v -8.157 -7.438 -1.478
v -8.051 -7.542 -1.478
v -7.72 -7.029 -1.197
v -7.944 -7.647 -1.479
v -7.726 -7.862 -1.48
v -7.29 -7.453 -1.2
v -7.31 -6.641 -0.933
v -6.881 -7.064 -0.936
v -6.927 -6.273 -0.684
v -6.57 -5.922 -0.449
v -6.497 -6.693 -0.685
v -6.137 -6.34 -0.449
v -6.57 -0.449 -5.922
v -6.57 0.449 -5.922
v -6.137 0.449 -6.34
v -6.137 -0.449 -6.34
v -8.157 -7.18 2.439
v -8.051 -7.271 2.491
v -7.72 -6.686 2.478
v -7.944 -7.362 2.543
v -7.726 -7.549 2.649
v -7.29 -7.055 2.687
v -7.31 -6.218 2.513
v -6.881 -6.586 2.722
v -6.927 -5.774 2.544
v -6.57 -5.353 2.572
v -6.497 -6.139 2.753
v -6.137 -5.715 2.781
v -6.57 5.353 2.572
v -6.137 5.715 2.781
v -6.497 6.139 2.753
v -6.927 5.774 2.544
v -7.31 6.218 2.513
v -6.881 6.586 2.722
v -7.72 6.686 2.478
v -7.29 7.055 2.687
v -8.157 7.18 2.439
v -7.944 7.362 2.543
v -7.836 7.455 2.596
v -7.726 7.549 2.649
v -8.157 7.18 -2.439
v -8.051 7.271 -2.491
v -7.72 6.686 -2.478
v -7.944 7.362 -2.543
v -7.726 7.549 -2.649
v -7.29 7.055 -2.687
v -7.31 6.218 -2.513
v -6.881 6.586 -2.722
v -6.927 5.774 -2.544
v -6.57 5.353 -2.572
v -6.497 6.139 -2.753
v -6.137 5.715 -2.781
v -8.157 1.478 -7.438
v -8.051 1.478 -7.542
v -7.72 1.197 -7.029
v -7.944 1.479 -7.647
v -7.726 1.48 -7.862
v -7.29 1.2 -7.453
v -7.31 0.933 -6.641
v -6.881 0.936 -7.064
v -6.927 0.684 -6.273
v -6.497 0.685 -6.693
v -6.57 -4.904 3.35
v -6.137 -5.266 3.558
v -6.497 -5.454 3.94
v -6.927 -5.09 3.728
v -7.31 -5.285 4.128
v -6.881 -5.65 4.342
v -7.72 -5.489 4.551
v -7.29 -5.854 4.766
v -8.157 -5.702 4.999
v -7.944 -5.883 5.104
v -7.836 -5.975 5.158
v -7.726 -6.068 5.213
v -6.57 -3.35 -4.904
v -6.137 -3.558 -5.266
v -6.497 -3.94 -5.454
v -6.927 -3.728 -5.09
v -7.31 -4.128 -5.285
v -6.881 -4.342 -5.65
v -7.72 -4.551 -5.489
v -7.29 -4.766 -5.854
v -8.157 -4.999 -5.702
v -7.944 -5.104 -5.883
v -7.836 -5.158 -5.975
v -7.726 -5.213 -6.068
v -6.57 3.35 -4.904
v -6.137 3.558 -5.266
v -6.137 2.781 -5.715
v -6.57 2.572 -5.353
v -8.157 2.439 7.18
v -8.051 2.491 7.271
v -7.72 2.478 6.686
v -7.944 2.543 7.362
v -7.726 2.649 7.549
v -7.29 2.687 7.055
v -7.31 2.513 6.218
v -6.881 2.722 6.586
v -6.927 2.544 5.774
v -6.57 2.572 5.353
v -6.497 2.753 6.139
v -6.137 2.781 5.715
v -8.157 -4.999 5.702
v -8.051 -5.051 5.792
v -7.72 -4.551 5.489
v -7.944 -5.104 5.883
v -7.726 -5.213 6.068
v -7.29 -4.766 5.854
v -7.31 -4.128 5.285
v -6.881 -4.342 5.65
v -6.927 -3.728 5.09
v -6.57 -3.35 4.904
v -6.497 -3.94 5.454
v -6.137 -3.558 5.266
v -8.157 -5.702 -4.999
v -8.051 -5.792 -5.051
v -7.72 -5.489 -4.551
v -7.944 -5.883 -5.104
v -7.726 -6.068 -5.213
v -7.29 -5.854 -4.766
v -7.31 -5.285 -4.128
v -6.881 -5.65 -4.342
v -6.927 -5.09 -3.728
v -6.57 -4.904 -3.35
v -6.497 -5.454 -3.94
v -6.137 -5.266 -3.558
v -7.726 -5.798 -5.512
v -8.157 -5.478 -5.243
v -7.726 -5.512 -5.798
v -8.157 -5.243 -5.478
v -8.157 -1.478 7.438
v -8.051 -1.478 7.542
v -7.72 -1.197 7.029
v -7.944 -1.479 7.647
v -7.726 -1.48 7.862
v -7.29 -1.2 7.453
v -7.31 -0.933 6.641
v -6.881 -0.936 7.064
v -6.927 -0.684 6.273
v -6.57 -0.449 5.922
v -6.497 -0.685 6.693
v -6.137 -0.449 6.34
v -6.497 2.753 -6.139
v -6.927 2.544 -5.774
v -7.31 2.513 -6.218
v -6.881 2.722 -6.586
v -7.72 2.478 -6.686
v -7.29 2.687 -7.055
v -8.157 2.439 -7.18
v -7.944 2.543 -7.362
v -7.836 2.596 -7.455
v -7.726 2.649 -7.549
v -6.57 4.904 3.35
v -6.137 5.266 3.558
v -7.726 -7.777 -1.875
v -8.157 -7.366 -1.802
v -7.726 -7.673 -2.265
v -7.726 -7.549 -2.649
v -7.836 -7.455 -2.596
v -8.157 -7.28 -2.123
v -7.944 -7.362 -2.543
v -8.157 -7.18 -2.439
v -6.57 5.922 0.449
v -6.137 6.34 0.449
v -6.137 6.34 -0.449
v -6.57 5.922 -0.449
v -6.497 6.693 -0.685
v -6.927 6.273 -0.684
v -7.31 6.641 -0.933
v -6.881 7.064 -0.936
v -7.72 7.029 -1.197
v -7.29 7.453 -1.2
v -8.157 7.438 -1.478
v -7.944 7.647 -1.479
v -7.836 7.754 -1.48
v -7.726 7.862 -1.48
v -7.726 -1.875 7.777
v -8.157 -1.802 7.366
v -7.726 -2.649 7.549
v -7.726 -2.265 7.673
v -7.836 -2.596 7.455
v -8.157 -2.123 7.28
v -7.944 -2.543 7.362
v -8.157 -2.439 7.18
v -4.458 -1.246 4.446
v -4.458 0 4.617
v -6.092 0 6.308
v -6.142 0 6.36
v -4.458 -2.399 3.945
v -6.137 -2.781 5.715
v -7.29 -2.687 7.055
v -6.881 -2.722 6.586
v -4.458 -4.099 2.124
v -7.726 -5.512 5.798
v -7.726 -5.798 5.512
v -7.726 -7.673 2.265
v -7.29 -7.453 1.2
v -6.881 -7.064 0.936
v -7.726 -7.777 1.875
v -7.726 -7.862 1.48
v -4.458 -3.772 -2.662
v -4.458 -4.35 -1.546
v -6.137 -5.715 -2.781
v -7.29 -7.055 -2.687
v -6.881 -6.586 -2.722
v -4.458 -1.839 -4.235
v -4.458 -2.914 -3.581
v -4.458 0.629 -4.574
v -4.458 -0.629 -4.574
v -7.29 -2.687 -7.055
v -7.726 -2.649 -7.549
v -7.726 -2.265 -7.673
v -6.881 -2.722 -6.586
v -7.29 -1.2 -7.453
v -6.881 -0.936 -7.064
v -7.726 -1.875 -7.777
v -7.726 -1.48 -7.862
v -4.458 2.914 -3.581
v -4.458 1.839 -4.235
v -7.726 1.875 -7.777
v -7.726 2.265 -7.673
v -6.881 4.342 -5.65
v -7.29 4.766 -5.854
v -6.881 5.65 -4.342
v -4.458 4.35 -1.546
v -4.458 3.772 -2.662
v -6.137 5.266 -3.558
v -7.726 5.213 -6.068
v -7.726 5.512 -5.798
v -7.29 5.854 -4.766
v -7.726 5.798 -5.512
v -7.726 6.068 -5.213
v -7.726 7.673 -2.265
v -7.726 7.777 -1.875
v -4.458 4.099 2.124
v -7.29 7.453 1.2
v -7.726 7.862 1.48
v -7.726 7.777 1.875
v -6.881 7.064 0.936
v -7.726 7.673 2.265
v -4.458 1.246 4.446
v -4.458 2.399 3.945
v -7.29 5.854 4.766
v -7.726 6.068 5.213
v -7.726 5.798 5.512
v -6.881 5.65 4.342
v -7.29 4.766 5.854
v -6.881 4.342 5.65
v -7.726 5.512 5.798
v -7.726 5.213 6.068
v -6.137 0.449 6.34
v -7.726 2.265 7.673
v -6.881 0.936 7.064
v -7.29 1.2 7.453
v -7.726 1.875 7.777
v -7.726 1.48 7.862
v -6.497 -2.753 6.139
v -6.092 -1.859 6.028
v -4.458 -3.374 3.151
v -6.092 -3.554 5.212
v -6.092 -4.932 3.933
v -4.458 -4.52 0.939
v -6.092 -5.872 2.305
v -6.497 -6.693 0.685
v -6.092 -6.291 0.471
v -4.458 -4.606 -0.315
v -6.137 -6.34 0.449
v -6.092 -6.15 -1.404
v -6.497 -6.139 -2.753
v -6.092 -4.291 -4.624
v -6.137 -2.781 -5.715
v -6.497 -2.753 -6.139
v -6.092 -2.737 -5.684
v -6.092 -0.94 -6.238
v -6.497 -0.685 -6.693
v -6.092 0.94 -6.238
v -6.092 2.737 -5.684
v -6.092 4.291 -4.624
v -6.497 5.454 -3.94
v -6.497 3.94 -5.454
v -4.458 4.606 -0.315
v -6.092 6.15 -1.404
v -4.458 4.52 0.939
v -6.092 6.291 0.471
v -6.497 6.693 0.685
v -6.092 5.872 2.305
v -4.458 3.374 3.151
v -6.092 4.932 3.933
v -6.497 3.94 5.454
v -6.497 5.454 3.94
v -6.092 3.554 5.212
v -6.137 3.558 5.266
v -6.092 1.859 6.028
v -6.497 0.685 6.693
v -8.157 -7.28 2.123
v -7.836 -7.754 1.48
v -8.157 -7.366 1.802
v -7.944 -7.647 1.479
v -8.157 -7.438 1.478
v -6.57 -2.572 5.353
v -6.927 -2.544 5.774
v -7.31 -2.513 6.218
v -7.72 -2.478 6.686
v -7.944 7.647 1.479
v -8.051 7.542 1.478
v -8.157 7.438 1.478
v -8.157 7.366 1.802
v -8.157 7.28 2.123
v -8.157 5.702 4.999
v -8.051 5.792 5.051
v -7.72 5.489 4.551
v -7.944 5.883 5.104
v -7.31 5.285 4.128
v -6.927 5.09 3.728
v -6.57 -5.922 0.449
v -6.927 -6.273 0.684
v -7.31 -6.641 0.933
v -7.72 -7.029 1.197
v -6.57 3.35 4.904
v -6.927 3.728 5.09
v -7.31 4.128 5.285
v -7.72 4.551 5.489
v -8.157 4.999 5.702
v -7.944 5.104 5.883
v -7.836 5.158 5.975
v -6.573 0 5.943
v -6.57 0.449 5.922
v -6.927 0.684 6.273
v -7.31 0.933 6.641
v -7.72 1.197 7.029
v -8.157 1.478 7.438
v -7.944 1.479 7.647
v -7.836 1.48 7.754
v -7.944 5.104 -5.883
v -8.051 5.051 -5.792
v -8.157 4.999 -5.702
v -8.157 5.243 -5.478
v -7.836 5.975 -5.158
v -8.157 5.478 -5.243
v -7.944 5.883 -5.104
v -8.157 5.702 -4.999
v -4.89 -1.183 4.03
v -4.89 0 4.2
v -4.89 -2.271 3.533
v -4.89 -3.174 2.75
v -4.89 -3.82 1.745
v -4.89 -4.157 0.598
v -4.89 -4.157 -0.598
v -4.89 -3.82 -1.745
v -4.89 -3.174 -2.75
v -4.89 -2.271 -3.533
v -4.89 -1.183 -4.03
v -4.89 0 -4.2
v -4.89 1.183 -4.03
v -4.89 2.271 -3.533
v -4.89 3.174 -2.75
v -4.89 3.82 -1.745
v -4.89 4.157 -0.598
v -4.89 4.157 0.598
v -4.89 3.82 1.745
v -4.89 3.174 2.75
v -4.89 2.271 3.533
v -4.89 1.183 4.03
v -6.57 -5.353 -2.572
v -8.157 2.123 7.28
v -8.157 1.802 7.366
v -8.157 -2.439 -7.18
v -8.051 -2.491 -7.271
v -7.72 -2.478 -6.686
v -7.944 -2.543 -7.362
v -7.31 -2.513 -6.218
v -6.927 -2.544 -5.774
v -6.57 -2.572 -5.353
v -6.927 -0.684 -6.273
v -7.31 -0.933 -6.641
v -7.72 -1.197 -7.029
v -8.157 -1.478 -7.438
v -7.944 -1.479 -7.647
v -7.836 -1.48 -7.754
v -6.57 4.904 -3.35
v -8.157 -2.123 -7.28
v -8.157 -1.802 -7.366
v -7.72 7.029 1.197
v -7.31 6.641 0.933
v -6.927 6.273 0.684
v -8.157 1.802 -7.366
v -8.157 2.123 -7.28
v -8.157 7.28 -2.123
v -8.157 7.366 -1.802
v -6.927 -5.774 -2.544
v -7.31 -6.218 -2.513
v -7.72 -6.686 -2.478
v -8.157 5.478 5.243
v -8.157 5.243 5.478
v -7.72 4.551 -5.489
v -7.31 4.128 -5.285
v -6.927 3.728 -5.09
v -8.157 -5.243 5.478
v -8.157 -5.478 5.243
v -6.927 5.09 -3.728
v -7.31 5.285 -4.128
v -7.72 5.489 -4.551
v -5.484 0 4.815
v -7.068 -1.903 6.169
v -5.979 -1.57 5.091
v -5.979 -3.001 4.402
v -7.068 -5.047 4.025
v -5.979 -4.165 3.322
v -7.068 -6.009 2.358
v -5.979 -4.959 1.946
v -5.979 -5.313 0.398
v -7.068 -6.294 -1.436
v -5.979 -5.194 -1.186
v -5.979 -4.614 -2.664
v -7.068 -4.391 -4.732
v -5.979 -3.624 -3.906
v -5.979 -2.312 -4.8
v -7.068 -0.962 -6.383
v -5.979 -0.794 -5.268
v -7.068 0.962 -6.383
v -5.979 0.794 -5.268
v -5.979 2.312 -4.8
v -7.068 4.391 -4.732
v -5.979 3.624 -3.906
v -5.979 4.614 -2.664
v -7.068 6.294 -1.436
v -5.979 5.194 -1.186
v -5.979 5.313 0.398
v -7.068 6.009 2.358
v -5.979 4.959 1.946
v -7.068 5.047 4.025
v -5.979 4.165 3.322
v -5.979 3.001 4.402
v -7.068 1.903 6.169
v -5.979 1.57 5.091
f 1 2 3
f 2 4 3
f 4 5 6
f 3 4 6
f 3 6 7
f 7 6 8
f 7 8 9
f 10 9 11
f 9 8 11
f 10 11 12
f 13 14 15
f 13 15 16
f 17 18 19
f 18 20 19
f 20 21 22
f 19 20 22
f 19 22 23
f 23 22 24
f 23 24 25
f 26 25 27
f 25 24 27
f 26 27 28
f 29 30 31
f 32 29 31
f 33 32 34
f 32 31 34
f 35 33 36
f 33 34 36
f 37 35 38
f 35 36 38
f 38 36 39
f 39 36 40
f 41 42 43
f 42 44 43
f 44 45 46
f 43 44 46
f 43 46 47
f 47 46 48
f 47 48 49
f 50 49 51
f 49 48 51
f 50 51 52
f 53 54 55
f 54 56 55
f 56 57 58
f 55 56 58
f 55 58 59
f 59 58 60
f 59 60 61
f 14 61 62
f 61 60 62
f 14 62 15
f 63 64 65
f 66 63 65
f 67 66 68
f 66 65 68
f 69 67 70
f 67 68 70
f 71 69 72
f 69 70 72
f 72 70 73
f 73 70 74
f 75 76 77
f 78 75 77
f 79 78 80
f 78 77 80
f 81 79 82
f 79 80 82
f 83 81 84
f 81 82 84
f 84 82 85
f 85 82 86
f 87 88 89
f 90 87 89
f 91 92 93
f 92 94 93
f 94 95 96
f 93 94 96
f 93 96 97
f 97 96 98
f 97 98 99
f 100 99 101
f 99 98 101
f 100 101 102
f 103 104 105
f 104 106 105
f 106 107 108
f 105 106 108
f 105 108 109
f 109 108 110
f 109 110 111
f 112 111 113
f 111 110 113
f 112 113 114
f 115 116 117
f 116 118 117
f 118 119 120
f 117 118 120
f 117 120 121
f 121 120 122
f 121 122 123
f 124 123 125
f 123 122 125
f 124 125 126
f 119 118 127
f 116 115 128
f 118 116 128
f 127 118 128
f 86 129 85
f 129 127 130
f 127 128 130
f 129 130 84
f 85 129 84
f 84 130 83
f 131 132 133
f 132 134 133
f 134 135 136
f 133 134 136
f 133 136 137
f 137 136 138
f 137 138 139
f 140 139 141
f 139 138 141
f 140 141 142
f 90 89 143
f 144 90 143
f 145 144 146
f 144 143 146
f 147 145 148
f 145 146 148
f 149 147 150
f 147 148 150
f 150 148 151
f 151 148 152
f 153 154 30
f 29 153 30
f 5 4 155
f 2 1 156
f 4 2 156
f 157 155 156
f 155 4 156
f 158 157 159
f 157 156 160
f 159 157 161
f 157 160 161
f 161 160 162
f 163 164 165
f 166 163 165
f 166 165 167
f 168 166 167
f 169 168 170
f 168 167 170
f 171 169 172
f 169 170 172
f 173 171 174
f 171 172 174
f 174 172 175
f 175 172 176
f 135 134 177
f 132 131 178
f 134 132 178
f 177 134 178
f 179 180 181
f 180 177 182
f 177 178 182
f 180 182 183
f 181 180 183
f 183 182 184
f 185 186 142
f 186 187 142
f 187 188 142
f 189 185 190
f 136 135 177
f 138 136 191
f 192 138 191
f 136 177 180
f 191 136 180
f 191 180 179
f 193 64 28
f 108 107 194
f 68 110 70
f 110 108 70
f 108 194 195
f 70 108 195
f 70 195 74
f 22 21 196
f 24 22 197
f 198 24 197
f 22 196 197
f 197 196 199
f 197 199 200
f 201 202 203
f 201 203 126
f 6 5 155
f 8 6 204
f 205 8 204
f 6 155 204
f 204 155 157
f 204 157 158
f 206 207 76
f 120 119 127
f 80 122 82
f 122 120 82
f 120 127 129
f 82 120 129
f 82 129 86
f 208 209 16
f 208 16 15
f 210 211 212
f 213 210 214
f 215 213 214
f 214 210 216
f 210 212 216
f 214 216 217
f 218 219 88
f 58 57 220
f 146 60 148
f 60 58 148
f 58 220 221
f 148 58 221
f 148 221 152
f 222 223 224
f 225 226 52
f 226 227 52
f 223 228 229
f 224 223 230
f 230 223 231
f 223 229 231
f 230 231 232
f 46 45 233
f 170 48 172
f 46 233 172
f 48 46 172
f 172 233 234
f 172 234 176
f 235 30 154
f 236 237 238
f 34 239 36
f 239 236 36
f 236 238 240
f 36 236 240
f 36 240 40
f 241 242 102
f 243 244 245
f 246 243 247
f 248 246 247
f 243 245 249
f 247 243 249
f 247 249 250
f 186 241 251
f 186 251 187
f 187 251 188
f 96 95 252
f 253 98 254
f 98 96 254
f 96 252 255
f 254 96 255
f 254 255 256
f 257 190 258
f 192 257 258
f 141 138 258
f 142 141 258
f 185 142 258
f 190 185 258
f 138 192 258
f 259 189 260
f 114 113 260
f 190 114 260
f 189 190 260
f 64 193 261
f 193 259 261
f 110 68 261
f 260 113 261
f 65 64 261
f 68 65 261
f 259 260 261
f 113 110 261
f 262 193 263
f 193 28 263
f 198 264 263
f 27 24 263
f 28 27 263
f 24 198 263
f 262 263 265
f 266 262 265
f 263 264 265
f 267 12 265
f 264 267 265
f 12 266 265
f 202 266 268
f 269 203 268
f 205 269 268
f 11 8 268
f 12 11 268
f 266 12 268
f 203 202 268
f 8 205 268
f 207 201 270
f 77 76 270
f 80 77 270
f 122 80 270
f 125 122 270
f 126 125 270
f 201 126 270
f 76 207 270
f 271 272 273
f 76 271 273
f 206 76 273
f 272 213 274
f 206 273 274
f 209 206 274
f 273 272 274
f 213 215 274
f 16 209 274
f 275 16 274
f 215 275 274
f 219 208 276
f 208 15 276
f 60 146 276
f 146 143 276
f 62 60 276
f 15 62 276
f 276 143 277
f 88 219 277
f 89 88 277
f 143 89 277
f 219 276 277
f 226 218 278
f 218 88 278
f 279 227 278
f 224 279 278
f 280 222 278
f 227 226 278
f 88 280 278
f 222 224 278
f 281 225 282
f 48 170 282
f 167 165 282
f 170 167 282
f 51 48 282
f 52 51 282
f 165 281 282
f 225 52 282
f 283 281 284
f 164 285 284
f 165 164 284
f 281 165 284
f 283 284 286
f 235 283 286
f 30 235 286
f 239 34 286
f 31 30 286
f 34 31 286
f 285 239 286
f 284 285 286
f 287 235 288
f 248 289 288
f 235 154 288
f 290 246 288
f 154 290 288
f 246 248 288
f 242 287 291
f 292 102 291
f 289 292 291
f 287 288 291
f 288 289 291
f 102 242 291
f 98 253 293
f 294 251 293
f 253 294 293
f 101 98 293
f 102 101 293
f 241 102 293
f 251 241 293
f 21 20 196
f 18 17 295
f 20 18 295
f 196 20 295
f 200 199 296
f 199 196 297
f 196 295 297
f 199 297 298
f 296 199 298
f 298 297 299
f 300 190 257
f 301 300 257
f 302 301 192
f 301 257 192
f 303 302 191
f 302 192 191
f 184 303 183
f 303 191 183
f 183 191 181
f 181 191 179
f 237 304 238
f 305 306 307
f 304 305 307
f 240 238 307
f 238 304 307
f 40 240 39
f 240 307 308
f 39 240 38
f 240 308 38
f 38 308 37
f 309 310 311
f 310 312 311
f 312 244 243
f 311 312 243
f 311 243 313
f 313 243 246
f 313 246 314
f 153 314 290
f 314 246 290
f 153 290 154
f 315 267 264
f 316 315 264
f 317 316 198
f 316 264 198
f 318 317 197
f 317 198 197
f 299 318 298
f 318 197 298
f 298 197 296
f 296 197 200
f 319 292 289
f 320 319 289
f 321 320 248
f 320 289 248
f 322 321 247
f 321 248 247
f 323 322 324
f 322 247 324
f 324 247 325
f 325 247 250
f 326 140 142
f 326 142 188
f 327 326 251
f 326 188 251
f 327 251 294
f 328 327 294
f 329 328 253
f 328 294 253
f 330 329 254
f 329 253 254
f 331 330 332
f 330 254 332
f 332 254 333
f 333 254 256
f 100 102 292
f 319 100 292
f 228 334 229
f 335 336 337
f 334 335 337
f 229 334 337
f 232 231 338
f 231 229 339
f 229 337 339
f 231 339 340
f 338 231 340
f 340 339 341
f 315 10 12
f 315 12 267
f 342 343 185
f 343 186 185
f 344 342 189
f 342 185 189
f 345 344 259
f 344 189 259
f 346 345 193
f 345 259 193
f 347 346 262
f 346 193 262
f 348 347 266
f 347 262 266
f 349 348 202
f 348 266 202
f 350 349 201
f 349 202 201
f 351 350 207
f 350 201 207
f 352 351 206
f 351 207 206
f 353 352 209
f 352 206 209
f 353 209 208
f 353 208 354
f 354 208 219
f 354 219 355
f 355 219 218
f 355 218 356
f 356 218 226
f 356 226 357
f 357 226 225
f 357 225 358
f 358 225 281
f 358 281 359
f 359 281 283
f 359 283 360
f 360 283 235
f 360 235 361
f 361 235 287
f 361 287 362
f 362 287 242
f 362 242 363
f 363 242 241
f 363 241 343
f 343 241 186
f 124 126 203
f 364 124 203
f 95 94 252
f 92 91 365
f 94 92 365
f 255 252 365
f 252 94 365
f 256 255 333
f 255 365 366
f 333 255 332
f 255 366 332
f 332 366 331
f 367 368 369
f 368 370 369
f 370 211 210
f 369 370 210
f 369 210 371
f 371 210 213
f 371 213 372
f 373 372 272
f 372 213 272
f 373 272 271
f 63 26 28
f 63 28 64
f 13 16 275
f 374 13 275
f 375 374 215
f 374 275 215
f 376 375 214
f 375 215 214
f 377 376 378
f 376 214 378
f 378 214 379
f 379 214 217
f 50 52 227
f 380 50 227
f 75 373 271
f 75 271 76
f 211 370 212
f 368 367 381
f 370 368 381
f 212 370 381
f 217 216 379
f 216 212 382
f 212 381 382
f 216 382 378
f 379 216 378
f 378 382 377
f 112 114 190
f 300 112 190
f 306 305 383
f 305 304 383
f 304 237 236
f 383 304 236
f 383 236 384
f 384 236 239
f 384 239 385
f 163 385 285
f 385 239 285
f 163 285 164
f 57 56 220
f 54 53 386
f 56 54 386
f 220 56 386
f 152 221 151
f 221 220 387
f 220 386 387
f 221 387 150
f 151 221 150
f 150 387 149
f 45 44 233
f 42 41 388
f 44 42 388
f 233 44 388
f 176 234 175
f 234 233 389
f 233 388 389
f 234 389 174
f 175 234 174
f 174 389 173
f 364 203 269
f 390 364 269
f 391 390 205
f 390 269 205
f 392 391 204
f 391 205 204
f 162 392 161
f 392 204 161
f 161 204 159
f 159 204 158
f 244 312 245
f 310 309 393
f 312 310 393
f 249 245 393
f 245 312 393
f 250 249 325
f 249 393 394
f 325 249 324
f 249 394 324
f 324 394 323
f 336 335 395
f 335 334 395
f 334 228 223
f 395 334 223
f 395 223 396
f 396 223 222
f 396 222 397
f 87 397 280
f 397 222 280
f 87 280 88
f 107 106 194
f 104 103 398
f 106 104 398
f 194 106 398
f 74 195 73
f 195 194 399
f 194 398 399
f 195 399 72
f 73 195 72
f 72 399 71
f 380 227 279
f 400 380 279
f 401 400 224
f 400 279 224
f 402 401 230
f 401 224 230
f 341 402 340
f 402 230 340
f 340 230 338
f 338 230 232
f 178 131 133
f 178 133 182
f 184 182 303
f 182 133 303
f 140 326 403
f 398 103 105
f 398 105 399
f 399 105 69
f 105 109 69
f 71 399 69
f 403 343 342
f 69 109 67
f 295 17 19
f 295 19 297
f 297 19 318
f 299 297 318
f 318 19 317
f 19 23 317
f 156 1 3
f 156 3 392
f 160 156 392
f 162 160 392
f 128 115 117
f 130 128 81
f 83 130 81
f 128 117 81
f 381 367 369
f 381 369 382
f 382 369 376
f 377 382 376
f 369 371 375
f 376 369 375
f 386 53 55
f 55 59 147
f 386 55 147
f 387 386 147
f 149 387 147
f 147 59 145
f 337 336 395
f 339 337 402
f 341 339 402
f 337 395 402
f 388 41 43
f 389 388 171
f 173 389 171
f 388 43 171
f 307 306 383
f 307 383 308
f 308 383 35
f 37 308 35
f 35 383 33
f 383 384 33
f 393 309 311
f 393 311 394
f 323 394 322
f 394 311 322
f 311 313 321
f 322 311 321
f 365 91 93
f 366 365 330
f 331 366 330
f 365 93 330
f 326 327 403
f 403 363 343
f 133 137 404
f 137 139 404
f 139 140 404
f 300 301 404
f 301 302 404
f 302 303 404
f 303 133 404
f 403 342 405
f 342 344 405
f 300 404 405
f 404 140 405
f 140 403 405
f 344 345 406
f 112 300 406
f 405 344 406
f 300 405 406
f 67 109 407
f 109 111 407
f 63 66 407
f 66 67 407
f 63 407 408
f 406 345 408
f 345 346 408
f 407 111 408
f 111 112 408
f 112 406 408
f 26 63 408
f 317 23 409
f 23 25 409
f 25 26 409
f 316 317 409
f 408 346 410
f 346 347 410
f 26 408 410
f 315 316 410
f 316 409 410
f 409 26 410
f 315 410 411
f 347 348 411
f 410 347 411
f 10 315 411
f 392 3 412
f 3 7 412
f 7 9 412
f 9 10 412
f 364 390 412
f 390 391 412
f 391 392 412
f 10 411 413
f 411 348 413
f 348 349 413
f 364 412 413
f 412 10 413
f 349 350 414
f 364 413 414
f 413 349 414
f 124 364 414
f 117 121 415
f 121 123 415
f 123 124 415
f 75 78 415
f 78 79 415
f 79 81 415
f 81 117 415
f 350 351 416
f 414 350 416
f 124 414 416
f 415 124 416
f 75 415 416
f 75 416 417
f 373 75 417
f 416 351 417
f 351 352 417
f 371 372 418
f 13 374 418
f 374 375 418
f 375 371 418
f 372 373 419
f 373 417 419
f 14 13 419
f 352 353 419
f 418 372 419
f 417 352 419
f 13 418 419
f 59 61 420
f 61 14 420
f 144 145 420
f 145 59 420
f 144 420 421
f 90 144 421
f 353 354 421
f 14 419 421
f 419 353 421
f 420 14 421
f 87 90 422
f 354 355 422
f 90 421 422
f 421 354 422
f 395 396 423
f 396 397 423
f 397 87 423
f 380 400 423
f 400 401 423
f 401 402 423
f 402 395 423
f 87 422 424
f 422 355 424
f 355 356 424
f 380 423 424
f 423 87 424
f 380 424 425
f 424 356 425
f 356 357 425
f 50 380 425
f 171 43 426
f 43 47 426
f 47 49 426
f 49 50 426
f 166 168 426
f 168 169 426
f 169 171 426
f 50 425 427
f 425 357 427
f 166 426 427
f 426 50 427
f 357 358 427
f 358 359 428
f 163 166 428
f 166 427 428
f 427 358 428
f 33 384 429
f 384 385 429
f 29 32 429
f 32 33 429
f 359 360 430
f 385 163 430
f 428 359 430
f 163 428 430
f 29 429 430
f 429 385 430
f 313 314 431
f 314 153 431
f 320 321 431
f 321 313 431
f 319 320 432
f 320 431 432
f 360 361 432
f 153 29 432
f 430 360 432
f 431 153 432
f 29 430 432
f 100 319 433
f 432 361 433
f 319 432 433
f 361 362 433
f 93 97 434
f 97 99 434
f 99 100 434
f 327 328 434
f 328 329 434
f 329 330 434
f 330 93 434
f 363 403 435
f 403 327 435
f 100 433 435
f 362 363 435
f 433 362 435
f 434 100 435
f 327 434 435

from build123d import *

# Parameters (mm, degrees)
EXTCUT_DEPTH  = 19.184446463
EXTCUTS_COUNT = 12
EXTCUTS_ANGLE = 330


with BuildPart() as part:
    # SecSke → Base-Revolve (revolve)
    with BuildSketch(Plane.XY, mode=Mode.PRIVATE) as base_revolve_sk:
        Polygon((-4.458387129, 4.616795022), (-7.725510198, 8), (-8.157114079, 7.583204978), (-4.889991009, 4.2), align=None)
    revolve(base_revolve_sk.sketch.rotate(Axis((-34.925, 0, 0), (1, 0, 0)), 90), axis=Axis((-34.925, 0, 0), (1, 0, 0)))

    # ExtCutSke → ExtCut (cut, through all)
    with BuildSketch(Plane(origin=(-7.725510198, 8, 0), x_dir=(0, 0, 1), z_dir=(0.7193398003386475, 0.694658370459001, 0))):
        with BuildLine():
            Line((-0.448786028, 2.297632851), (-1.638758705, -0.238596355))
            ThreePointArc((-1.638758705, -0.238596355), (0, -0.4), (1.638758705, -0.238596355))
            Line((1.638758705, -0.238596355), (0.448786028, 2.297632851))
            ThreePointArc((0.448786028, 2.297632851), (0, 2.28), (-0.448786028, 2.297632851))
        make_face()
    extcut = extrude(amount=-EXTCUT_DEPTH, mode=Mode.SUBTRACT)

    # ExtCuts: ExtCut ×12 about axis
    extcuts_axis = Axis((-34.925, 0, 0), (1, 0, 0))
    for i in range(1, EXTCUTS_COUNT):
        add(extcut.rotate(extcuts_axis, i * EXTCUTS_ANGLE / (EXTCUTS_COUNT - 1)), mode=Mode.SUBTRACT)


solid = part.part
